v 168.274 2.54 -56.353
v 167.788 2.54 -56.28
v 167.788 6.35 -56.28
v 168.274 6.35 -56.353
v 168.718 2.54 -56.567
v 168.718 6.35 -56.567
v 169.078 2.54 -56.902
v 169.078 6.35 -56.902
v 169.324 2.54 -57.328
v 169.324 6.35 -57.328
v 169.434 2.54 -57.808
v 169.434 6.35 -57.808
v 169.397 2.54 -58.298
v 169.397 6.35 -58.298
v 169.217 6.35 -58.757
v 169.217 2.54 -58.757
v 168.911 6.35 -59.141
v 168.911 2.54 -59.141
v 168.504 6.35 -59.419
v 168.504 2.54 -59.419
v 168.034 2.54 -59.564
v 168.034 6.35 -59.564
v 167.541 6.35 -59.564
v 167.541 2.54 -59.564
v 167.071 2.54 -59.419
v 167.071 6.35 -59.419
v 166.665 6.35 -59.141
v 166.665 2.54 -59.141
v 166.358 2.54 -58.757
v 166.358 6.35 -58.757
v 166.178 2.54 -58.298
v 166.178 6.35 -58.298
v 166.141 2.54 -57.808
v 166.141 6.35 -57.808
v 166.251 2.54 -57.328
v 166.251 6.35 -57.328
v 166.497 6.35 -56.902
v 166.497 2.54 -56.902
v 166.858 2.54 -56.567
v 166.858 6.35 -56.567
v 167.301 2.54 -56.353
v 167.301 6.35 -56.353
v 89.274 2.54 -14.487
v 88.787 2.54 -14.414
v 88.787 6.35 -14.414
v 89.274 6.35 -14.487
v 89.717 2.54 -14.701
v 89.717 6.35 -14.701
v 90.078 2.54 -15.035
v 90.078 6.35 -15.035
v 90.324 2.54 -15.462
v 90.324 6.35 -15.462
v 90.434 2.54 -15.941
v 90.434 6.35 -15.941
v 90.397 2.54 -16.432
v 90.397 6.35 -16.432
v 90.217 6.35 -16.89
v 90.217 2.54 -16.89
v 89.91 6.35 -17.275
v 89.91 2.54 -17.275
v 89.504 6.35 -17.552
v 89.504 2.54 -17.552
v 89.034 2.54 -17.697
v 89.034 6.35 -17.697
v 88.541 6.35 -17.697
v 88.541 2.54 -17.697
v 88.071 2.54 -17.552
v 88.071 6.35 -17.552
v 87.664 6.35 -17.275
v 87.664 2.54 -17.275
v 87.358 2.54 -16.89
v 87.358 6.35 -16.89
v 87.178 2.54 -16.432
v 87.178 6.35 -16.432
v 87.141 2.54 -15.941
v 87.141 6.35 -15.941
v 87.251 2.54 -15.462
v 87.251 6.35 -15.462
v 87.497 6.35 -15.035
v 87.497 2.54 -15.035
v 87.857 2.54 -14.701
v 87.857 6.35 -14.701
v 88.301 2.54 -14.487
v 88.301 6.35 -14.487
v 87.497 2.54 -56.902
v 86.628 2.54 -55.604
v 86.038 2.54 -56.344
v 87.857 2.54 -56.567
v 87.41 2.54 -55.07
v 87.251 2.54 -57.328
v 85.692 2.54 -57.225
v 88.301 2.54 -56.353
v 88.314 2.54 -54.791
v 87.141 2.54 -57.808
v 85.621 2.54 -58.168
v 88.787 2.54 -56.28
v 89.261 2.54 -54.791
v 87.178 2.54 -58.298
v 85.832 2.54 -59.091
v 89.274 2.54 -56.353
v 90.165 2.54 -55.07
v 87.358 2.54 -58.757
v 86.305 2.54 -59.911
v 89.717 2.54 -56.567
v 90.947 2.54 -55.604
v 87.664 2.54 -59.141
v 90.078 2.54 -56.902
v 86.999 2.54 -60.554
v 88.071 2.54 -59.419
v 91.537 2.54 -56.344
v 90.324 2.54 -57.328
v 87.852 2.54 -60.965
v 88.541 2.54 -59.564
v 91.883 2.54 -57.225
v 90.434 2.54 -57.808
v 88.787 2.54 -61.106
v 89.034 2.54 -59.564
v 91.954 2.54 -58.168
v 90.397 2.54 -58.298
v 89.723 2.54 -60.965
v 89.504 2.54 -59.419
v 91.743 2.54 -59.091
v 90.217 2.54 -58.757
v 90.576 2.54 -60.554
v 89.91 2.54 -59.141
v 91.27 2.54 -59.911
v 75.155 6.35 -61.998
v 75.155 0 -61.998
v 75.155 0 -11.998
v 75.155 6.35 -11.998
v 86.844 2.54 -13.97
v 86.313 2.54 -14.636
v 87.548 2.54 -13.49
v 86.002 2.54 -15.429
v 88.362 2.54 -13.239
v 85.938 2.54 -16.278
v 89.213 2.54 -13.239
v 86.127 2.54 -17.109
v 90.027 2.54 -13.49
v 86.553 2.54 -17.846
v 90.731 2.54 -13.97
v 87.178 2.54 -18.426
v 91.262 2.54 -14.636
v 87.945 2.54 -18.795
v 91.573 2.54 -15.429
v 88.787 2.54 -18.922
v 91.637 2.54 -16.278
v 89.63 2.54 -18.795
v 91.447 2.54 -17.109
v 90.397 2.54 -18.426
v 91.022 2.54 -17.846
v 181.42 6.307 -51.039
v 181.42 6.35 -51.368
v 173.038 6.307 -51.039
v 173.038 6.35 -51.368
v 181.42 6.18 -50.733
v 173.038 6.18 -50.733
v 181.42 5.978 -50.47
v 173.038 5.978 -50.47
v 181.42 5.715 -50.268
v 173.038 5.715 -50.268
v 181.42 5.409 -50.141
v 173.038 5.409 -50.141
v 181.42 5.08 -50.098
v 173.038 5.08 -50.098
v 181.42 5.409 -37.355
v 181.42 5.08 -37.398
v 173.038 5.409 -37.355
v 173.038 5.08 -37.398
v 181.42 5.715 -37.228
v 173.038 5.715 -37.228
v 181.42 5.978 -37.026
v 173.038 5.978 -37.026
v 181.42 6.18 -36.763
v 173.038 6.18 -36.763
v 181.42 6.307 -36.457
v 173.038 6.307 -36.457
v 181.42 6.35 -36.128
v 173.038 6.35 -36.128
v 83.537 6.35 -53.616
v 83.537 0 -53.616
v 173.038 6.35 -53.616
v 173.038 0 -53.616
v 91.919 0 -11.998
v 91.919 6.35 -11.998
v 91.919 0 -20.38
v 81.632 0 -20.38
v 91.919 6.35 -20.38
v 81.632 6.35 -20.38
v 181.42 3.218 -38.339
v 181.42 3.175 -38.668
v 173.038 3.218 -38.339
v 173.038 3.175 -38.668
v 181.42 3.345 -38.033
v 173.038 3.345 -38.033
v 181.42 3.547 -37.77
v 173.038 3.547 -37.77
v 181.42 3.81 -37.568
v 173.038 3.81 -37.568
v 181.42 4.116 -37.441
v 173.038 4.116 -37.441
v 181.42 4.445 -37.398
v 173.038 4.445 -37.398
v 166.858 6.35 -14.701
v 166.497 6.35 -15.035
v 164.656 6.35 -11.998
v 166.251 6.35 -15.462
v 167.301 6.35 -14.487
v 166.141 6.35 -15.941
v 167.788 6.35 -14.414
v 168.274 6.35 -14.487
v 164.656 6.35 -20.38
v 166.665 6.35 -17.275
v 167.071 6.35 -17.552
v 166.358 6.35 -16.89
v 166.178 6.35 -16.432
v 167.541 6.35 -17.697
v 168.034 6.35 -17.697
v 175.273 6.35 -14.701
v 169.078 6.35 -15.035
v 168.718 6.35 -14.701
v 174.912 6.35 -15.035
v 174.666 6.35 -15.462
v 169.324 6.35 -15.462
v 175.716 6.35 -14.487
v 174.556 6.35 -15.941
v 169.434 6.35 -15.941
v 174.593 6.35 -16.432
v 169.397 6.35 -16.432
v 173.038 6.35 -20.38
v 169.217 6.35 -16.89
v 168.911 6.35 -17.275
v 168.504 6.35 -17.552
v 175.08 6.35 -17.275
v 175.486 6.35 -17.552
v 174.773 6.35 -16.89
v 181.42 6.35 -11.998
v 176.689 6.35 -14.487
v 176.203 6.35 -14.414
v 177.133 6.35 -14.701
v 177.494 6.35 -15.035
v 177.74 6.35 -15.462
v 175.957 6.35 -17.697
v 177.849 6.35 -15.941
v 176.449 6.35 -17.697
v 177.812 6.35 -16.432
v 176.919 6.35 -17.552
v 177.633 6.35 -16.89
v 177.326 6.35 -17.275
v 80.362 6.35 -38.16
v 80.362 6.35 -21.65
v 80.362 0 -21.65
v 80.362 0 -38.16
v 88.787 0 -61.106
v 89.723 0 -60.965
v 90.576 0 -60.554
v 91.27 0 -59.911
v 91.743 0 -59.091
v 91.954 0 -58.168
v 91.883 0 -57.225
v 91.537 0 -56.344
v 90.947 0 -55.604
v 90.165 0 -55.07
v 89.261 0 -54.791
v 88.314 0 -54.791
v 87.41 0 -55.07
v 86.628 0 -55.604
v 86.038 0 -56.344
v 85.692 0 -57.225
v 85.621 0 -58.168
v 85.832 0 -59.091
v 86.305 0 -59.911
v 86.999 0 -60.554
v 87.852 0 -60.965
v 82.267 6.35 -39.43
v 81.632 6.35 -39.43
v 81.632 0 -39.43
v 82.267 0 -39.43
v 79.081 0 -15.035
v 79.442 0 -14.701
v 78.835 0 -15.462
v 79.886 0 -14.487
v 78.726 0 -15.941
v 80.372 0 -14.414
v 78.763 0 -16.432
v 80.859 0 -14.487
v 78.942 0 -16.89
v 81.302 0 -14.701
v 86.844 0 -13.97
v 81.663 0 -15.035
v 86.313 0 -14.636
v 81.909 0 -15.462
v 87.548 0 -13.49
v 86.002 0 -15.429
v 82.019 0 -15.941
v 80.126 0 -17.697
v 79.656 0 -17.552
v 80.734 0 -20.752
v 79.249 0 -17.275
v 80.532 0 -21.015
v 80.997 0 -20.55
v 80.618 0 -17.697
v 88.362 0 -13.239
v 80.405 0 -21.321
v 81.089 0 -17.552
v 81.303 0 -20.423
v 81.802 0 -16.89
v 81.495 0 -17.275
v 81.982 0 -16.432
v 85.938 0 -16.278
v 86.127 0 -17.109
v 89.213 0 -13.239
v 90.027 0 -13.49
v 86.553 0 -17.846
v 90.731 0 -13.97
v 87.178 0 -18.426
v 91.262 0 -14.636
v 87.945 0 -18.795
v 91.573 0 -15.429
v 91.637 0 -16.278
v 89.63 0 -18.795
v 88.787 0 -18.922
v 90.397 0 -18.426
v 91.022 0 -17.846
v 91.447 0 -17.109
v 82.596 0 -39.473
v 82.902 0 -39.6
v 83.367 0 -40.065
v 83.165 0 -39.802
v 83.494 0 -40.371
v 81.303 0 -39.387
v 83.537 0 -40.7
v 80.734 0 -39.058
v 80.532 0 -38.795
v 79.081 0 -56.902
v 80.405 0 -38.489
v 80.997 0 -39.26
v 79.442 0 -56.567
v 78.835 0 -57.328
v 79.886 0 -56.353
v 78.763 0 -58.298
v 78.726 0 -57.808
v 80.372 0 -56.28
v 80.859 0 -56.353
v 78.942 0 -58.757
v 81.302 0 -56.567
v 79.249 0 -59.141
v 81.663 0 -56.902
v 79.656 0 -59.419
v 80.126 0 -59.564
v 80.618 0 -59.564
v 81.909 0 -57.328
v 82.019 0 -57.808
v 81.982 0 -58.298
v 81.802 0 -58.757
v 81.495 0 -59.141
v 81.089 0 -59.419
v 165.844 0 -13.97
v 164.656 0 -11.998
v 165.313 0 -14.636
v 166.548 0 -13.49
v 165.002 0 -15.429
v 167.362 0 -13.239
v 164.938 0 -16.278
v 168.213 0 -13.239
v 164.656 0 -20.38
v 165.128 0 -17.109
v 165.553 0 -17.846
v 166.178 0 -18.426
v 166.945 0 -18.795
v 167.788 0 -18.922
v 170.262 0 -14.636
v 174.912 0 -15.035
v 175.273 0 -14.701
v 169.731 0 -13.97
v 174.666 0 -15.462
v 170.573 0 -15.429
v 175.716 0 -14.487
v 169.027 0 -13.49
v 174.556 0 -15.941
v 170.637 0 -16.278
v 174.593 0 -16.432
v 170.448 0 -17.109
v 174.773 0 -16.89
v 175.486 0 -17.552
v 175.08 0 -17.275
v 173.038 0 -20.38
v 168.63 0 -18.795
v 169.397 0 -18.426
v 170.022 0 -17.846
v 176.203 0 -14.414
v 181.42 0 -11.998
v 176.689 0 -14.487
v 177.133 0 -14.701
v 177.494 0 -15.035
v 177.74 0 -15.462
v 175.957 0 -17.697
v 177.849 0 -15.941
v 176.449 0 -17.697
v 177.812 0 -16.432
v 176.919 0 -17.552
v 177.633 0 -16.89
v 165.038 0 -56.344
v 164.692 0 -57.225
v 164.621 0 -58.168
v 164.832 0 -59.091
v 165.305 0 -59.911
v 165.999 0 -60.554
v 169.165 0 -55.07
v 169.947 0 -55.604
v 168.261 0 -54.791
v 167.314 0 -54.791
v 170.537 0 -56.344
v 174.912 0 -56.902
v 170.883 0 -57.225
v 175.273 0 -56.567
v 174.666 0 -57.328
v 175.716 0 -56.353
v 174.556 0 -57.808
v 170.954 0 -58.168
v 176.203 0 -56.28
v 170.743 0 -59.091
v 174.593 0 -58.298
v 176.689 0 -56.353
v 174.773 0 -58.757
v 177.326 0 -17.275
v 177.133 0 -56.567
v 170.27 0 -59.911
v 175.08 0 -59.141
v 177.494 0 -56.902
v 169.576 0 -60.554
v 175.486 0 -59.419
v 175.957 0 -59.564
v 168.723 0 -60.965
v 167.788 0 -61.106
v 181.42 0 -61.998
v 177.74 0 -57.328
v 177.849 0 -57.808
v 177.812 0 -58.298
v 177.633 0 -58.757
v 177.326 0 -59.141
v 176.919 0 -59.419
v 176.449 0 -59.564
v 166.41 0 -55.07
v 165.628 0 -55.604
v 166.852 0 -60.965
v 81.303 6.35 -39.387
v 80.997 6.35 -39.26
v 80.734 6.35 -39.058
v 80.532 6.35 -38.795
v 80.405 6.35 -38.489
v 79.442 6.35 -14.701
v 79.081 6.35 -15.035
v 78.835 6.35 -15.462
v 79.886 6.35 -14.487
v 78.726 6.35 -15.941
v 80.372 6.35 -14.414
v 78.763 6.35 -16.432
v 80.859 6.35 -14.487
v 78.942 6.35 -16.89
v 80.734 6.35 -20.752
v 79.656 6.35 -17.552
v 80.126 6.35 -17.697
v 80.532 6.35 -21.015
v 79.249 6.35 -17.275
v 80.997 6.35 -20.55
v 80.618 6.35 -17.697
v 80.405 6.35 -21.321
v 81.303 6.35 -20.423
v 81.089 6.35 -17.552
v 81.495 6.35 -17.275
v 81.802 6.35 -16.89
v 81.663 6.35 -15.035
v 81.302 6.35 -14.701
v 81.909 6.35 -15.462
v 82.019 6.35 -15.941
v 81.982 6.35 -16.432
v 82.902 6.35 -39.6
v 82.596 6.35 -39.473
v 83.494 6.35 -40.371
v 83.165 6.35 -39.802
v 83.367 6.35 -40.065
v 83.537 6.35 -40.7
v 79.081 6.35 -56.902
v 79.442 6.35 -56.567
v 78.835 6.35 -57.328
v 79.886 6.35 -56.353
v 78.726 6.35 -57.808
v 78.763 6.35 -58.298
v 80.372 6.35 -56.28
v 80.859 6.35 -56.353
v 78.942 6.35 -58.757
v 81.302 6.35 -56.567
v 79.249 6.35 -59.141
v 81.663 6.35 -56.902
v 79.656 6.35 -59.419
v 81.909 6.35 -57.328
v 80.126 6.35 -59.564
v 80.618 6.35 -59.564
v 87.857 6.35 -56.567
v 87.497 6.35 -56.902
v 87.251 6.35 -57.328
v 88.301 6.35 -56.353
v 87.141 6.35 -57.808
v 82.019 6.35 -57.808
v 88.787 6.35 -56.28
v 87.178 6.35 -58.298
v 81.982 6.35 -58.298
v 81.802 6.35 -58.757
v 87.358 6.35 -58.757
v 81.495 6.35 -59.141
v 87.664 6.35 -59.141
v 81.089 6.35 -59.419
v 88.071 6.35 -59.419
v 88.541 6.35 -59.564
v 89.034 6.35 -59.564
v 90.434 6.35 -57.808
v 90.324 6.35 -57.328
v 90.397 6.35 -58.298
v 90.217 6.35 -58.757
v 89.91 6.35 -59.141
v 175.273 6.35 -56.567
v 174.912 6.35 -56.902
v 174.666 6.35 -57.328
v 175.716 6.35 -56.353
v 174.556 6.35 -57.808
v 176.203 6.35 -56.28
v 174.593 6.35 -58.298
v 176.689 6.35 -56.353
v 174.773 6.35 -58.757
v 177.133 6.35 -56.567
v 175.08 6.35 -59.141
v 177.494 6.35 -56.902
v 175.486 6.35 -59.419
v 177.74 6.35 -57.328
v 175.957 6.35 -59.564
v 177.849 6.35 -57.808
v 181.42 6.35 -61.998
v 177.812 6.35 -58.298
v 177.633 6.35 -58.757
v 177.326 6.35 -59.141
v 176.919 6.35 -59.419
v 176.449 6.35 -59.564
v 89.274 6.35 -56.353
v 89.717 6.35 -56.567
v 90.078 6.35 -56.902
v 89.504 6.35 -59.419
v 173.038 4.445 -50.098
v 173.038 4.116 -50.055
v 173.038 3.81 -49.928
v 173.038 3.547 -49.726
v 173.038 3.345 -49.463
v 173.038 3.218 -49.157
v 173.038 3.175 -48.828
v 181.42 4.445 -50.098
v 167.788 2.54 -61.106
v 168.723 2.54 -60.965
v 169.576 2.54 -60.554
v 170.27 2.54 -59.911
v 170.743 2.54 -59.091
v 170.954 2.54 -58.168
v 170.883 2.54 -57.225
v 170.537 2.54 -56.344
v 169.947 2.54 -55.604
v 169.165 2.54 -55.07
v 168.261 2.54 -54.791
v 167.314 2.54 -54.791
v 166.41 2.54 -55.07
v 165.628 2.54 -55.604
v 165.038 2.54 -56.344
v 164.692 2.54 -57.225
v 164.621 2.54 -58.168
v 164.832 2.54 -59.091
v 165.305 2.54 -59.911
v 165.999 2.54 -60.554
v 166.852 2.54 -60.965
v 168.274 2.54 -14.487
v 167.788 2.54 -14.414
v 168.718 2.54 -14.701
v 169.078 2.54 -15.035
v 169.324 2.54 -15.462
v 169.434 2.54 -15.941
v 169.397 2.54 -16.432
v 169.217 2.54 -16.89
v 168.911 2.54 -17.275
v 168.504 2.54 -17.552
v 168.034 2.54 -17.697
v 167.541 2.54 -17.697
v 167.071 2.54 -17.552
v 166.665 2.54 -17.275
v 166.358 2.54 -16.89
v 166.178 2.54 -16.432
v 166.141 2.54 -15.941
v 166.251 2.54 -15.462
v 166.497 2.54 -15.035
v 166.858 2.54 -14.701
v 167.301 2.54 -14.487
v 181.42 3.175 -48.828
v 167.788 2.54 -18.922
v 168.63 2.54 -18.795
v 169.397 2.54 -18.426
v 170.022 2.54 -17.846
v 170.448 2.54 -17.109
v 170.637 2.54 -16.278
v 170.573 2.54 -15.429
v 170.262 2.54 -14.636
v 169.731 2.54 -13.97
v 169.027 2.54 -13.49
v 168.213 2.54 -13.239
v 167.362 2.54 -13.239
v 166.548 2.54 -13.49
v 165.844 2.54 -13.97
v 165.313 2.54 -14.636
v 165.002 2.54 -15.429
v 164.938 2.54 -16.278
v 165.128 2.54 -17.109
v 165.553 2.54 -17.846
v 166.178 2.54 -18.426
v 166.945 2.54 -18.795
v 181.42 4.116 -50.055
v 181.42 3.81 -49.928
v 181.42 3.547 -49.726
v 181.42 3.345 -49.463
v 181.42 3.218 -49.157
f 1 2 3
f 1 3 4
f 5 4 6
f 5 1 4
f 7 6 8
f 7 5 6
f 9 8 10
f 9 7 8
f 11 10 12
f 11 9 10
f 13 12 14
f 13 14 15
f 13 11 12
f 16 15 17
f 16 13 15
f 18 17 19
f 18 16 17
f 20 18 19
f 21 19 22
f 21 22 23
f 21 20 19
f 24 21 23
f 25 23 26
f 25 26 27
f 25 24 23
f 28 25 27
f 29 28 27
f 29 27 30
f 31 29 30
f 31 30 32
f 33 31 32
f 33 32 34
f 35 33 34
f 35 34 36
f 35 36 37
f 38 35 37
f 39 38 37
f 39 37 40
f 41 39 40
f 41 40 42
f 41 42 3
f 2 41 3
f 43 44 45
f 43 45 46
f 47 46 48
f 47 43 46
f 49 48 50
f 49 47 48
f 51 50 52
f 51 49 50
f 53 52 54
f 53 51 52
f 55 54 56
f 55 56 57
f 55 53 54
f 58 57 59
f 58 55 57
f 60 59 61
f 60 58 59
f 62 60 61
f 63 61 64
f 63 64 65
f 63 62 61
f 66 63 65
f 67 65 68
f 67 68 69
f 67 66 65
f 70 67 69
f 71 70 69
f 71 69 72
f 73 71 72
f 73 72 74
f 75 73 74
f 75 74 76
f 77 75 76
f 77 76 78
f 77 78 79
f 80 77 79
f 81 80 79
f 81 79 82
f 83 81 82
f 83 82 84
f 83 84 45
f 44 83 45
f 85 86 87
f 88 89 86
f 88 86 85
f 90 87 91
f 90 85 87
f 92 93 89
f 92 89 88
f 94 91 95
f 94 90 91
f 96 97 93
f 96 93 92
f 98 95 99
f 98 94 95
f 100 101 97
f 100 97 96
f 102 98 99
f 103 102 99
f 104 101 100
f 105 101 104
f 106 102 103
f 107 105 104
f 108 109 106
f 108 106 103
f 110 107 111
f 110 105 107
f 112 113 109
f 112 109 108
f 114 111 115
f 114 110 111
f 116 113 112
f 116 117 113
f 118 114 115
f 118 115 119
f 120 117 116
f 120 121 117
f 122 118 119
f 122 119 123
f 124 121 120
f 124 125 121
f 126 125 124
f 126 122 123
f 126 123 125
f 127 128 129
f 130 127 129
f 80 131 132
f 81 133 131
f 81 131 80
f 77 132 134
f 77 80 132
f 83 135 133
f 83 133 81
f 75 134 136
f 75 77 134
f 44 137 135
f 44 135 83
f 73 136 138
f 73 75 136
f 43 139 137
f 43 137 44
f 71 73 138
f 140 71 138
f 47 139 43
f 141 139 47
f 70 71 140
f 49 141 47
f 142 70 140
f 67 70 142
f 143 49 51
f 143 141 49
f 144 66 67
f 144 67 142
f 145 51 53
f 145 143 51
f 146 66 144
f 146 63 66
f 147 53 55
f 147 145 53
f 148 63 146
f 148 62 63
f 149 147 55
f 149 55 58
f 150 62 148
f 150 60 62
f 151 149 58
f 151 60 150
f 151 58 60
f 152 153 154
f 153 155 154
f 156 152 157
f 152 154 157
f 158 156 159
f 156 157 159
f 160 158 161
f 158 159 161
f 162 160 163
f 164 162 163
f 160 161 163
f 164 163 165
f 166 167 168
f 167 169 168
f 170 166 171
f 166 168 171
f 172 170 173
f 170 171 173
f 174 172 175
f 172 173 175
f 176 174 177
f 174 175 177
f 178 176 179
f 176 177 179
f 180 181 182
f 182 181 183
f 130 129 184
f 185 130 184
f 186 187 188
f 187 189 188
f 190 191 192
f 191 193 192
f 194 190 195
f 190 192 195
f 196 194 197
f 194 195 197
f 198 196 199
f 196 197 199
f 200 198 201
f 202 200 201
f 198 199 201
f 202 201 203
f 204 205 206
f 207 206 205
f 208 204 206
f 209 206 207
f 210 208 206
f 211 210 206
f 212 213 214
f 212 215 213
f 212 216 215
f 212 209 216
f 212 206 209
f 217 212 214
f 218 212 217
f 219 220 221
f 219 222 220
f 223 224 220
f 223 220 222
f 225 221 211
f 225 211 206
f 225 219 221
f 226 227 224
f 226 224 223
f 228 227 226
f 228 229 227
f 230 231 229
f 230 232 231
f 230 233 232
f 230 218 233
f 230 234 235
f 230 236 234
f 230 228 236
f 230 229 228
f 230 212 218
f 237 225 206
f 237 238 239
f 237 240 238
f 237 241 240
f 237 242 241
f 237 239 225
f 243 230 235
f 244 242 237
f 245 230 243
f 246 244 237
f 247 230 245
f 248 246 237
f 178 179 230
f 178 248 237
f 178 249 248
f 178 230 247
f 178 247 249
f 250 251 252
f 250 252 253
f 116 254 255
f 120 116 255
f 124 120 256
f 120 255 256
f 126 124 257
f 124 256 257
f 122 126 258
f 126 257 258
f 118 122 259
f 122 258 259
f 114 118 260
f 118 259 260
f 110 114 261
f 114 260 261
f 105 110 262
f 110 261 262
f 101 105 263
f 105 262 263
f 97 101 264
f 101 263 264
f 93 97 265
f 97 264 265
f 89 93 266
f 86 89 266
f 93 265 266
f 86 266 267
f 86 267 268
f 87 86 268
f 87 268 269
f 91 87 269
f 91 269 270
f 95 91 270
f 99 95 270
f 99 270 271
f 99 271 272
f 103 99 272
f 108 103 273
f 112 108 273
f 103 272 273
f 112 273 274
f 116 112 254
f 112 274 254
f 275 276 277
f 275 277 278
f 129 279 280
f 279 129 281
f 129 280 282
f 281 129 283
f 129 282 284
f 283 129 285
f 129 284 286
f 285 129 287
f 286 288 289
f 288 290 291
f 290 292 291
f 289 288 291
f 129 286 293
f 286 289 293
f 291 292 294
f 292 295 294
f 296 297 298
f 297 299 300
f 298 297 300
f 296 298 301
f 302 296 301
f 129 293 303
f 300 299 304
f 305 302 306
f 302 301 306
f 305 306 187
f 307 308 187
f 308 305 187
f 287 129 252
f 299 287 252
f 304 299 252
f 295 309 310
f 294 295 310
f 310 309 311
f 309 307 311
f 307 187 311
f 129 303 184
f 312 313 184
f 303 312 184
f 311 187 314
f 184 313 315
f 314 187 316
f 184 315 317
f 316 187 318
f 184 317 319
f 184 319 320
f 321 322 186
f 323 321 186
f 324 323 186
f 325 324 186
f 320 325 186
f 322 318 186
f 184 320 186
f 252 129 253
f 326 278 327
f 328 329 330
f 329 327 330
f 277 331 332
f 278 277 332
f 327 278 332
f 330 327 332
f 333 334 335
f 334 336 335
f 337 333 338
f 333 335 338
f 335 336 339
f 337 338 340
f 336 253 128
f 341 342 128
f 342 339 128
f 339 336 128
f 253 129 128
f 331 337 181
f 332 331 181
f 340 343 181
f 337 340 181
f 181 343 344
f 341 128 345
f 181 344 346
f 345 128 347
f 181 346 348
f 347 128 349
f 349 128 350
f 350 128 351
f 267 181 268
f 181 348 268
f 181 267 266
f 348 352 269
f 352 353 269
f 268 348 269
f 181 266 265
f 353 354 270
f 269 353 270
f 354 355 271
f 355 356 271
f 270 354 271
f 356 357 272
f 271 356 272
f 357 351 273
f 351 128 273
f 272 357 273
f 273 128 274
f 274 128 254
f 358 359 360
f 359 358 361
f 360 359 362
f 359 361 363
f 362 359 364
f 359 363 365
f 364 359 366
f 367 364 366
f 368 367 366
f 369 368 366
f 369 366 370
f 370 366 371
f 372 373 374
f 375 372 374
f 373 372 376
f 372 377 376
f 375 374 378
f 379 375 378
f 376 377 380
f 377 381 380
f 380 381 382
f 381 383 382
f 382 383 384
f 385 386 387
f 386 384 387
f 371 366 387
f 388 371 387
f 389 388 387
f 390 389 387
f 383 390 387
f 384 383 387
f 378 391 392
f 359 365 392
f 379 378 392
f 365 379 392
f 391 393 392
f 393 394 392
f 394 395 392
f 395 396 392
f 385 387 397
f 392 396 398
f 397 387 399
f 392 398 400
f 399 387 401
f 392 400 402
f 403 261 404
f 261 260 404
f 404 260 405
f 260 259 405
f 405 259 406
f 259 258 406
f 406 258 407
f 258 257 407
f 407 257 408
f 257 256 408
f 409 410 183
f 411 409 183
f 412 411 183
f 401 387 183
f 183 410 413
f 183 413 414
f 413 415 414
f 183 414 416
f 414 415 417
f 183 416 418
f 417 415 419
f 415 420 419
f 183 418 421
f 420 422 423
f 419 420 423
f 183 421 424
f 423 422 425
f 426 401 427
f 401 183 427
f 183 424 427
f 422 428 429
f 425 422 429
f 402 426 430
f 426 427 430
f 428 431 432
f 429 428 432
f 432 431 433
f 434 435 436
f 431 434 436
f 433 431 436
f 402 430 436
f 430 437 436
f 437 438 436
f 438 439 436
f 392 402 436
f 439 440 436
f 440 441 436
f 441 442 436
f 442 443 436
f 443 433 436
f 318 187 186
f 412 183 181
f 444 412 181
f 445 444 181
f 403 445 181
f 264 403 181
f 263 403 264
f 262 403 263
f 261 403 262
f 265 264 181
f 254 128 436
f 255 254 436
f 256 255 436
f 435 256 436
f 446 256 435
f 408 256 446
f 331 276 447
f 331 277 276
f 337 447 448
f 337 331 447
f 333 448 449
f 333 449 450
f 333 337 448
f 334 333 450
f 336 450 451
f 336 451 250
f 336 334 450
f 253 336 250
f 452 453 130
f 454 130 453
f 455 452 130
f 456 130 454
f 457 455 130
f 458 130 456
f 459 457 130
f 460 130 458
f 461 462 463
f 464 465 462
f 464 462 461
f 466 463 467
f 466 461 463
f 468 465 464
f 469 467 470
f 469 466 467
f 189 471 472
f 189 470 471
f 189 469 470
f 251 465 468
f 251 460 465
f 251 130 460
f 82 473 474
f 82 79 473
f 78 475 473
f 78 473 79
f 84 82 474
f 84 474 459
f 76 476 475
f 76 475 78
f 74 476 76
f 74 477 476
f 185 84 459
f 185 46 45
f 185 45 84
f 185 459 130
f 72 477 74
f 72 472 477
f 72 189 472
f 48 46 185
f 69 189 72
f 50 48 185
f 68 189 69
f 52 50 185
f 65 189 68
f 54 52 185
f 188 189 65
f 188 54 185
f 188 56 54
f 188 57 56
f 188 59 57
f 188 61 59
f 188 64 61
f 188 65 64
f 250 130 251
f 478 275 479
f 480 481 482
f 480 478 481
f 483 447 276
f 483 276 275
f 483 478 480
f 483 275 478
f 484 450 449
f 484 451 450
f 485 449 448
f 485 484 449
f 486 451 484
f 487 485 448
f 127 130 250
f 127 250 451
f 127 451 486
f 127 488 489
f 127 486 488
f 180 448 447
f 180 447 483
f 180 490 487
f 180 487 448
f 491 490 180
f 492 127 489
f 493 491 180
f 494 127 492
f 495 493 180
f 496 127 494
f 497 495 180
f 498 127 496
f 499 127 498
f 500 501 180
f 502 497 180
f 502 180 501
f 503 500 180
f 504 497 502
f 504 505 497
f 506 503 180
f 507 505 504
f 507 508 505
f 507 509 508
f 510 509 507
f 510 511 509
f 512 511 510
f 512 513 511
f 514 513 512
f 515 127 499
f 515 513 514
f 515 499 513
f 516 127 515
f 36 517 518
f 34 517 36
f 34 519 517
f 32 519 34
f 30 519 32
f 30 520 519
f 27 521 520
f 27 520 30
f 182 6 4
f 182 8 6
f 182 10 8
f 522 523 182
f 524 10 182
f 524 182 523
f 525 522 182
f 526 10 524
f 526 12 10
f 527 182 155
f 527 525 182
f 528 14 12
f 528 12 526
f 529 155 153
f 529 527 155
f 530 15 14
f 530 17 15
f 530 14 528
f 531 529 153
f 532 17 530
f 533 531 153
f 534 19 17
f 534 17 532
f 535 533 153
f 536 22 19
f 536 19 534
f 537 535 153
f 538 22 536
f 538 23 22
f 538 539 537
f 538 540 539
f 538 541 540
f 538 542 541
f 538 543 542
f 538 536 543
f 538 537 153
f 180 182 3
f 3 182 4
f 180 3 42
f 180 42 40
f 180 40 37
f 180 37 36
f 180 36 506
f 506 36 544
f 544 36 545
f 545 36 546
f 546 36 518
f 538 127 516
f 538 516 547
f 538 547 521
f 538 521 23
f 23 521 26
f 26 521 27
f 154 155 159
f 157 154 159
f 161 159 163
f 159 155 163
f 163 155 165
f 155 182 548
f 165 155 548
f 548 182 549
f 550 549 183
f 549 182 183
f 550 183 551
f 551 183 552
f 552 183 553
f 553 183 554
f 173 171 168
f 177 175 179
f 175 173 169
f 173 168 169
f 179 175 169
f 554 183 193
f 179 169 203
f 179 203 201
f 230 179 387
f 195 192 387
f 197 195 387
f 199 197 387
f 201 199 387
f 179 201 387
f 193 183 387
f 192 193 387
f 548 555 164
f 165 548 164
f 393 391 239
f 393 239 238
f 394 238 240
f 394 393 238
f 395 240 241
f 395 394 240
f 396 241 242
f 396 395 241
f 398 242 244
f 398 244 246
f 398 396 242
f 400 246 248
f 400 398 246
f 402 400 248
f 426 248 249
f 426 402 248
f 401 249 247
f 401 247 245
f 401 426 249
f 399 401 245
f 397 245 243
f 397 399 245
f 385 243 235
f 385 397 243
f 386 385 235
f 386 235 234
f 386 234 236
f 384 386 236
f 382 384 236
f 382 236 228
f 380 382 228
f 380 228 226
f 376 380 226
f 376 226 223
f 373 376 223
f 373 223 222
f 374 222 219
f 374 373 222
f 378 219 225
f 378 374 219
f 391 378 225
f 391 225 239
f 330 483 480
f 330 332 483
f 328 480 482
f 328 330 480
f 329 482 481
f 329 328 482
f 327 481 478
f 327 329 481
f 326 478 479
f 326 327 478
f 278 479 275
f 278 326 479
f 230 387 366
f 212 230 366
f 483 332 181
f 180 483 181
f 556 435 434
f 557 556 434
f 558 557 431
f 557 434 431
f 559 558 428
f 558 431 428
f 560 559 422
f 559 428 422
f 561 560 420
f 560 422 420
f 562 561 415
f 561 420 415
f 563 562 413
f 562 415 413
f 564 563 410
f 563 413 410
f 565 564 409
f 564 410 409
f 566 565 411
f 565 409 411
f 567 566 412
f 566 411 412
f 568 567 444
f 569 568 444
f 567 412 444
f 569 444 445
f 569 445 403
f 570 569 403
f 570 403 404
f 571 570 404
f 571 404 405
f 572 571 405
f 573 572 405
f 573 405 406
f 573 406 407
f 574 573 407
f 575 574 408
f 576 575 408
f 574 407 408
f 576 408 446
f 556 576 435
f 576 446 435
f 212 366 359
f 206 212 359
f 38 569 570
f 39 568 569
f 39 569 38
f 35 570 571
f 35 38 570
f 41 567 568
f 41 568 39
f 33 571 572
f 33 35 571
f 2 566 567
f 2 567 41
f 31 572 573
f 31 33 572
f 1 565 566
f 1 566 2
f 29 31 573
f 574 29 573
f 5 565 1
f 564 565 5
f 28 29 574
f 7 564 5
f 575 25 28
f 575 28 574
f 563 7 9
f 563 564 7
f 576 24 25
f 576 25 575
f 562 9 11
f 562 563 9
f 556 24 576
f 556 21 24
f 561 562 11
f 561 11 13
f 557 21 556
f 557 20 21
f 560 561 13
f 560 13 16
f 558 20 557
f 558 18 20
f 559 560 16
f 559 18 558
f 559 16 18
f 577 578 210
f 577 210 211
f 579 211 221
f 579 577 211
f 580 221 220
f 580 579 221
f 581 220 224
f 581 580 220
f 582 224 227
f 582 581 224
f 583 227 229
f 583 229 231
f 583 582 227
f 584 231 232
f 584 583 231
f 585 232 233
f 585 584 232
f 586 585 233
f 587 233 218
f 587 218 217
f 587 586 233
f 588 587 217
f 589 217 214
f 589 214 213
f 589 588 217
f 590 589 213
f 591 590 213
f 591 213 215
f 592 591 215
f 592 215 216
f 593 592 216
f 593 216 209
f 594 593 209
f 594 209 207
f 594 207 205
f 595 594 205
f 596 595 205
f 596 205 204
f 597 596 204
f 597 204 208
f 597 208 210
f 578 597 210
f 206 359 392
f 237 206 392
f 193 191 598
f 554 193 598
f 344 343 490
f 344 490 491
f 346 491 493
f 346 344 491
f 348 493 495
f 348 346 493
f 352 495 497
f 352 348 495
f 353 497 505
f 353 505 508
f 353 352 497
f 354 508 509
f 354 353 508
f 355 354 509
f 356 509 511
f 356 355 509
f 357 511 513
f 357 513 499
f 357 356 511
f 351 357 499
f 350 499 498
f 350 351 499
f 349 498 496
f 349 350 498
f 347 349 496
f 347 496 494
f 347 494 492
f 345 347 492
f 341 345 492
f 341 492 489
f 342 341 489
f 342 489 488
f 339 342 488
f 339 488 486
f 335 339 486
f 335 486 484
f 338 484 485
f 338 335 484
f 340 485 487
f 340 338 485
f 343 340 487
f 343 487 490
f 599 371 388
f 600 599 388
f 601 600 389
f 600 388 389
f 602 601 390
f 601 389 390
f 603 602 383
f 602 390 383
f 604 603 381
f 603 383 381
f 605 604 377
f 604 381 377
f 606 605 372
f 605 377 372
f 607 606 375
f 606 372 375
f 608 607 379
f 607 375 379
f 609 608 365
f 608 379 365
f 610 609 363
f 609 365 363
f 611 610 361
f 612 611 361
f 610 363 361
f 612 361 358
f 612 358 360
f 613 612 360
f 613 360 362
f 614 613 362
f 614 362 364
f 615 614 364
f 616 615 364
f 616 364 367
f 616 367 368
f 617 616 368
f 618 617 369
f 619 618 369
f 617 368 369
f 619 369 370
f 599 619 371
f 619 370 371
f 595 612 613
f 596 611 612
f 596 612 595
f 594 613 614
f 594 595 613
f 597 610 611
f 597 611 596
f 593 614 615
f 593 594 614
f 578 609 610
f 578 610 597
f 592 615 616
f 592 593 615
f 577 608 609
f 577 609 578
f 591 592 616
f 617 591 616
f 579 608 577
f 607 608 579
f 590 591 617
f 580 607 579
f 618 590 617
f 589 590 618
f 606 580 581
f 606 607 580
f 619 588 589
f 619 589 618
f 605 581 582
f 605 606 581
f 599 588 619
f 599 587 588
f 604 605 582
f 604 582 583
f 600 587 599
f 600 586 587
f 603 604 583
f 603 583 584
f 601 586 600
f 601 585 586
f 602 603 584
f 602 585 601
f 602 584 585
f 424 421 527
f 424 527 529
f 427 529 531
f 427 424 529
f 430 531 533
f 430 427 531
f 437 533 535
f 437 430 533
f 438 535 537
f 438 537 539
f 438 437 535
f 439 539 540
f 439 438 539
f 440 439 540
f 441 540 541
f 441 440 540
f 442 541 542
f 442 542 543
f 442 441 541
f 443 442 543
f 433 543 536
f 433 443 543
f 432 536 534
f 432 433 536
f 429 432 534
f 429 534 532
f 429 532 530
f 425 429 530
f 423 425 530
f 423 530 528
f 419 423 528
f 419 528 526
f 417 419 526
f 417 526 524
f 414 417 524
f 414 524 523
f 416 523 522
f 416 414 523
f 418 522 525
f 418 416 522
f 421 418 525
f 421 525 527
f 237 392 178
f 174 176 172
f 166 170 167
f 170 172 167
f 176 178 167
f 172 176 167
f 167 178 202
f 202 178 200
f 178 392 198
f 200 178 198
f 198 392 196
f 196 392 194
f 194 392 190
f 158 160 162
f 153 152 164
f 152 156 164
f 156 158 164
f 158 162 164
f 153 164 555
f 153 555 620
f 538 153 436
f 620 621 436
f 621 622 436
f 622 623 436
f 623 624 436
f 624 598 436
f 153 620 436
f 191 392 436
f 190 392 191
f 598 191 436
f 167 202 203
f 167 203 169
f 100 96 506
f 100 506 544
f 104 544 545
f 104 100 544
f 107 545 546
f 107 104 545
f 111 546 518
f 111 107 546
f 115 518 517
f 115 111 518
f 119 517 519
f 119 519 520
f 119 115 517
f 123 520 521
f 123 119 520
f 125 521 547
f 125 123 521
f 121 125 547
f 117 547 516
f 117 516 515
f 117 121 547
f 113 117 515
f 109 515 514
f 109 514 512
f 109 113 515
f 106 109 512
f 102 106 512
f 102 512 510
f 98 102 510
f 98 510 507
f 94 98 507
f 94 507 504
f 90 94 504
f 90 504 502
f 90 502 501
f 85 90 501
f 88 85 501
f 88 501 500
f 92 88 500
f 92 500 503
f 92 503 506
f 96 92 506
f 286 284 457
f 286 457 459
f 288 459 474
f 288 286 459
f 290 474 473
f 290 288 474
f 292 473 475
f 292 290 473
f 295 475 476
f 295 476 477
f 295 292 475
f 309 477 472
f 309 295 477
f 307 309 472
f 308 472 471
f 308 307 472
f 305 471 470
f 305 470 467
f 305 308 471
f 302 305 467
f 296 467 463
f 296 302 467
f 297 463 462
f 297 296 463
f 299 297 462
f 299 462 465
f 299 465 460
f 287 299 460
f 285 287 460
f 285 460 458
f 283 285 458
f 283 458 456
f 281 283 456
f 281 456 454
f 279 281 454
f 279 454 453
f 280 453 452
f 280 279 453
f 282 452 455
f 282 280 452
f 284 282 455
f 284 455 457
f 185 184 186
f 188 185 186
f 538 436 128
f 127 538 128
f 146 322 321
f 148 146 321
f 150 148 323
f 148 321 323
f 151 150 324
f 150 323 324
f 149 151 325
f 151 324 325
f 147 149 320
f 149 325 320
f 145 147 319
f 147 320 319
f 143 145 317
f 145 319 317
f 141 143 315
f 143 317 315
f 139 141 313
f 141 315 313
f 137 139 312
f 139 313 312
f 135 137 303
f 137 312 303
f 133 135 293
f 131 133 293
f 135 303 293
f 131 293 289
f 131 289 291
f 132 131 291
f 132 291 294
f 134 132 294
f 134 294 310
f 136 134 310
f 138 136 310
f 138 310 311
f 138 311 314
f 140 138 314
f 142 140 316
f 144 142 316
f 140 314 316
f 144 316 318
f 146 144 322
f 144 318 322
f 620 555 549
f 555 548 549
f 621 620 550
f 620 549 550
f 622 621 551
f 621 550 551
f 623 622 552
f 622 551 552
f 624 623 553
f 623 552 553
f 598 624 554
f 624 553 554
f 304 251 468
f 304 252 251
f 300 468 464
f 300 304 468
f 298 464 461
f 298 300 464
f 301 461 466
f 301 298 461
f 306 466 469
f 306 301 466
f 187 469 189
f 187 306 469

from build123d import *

# Parameters (mm, degrees)
SKETCH1_R           = 1.651
BOSS_EXTRUDE1_DEPTH = 6.35
SKETCH2_W           = 12.7
SKETCH2_H           = 3.175
CUT_EXTRUDE7_DEPTH  = 8.89
FILLET2_R           = 1.27
SKETCH4_W           = 3.175
SKETCH4_H           = 19.05
CUT_EXTRUDE8_DEPTH  = 192.82600491
FILLET3_R           = 1.27
SKETCH5_R           = 2.8575
SKETCH5_R_2         = 3.175
CUT_EXTRUDE9_DEPTH  = 2.54


with BuildPart() as part:
    # Sketch1 → Boss-Extrude1 (new body)
    with BuildSketch(Plane(origin=(0, 0, 0), x_dir=(1, 0, 0), z_dir=(0, 1, 0))):
        Polygon((75.155177047, 61.997896552), (75.155177047, 11.997896552), (91.919177047, 11.997896552), (91.919177047, 20.379896552), (83.537177047, 20.379896552), (83.537177047, 53.615896552), (173.037829354, 53.615896552), (173.037829354, 20.379896552), (164.655829354, 20.379896552), (164.655829354, 11.997896552), (181.419829354, 11.997896552), (181.419829354, 61.997896552), align=None)
        with Locations(Location((80.3721812, 16.064784874, 0), (0, 0, 270))):
            Circle(SKETCH1_R, mode=Mode.SUBTRACT)
        with Locations(Location((80.3721812, 57.93100823, 0), (0, 0, 270))):
            Circle(SKETCH1_R, mode=Mode.SUBTRACT)
        with Locations(Location((88.7874552, 16.064784874, 0), (0, 0, 270))):
            Circle(SKETCH1_R, mode=Mode.SUBTRACT)
        with Locations(Location((167.7875512, 57.93100823, 0), (0, 0, 270))):
            Circle(SKETCH1_R, mode=Mode.SUBTRACT)
        with Locations(Location((88.7874552, 57.93100823, 0), (0, 0, 270))):
            Circle(SKETCH1_R, mode=Mode.SUBTRACT)
        with Locations(Location((176.2028252, 57.93100823, 0), (0, 0, 270))):
            Circle(SKETCH1_R, mode=Mode.SUBTRACT)
        with Locations(Location((176.2028252, 16.064784874, 0), (0, 0, 270))):
            Circle(SKETCH1_R, mode=Mode.SUBTRACT)
        with Locations(Location((167.7875512, 16.064784874, 0), (0, 0, 270))):
            Circle(SKETCH1_R, mode=Mode.SUBTRACT)
    extrude(amount=BOSS_EXTRUDE1_DEPTH)

    # Sketch2 → Cut-Extrude7 (cut)
    with BuildSketch(Plane(origin=(181.419829354, 0, 0), x_dir=(0, 0, -1), z_dir=(1, 0, 0))):
        with Locations((43.747896552, 4.7625)):
            Rectangle(SKETCH2_W, SKETCH2_H)
    extrude(amount=-CUT_EXTRUDE7_DEPTH, mode=Mode.SUBTRACT)

    # Fillet2
    fillet2_edges = [part.edges().sort_by_distance(p)[0] for p in [
        (177.228829354, 6.35, -37.397896552),
        (177.228829354, 6.35, -50.097896552),
        (177.228829354, 3.175, -50.097896552),
        (177.228829354, 3.175, -37.397896552),
    ]]
    fillet(fillet2_edges, radius=FILLET2_R)

    # Sketch4 → Cut-Extrude8 (cut, through all)
    with BuildSketch(Plane(origin=(0, 6.35, 0), x_dir=(1, 0, 0), z_dir=(0, 1, 0))):
        with Locations((81.949677047, 29.904896552)):
            Rectangle(SKETCH4_W, SKETCH4_H)
    extrude(amount=-CUT_EXTRUDE8_DEPTH, mode=Mode.SUBTRACT)

    # Fillet3
    fillet3_edges = [part.edges().sort_by_distance(p)[0] for p in [
        (83.537177047, 3.175, -39.429896552),
        (80.362177047, 3.175, -20.379896552),
        (80.362177047, 3.175, -39.429896552),
    ]]
    fillet(fillet3_edges, radius=FILLET3_R)

    # Sketch5 → Cut-Extrude9 (cut)
    with BuildSketch(Plane.XZ):
        with Locations(Location((88.7874552, -16.064784874, 0), (0, 0, 270))):
            Circle(SKETCH5_R)
        with Locations(Location((88.7874552, -57.93100823, 0), (0, 0, 270))):
            Circle(SKETCH5_R_2)
        with Locations(Location((167.7875512, -57.93100823, 0), (0, 0, 270))):
            Circle(SKETCH5_R_2)
        with Locations(Location((167.7875512, -16.064784874, 0), (0, 0, 270))):
            Circle(SKETCH5_R)
    extrude(amount=-CUT_EXTRUDE9_DEPTH, mode=Mode.SUBTRACT)


solid = part.part
